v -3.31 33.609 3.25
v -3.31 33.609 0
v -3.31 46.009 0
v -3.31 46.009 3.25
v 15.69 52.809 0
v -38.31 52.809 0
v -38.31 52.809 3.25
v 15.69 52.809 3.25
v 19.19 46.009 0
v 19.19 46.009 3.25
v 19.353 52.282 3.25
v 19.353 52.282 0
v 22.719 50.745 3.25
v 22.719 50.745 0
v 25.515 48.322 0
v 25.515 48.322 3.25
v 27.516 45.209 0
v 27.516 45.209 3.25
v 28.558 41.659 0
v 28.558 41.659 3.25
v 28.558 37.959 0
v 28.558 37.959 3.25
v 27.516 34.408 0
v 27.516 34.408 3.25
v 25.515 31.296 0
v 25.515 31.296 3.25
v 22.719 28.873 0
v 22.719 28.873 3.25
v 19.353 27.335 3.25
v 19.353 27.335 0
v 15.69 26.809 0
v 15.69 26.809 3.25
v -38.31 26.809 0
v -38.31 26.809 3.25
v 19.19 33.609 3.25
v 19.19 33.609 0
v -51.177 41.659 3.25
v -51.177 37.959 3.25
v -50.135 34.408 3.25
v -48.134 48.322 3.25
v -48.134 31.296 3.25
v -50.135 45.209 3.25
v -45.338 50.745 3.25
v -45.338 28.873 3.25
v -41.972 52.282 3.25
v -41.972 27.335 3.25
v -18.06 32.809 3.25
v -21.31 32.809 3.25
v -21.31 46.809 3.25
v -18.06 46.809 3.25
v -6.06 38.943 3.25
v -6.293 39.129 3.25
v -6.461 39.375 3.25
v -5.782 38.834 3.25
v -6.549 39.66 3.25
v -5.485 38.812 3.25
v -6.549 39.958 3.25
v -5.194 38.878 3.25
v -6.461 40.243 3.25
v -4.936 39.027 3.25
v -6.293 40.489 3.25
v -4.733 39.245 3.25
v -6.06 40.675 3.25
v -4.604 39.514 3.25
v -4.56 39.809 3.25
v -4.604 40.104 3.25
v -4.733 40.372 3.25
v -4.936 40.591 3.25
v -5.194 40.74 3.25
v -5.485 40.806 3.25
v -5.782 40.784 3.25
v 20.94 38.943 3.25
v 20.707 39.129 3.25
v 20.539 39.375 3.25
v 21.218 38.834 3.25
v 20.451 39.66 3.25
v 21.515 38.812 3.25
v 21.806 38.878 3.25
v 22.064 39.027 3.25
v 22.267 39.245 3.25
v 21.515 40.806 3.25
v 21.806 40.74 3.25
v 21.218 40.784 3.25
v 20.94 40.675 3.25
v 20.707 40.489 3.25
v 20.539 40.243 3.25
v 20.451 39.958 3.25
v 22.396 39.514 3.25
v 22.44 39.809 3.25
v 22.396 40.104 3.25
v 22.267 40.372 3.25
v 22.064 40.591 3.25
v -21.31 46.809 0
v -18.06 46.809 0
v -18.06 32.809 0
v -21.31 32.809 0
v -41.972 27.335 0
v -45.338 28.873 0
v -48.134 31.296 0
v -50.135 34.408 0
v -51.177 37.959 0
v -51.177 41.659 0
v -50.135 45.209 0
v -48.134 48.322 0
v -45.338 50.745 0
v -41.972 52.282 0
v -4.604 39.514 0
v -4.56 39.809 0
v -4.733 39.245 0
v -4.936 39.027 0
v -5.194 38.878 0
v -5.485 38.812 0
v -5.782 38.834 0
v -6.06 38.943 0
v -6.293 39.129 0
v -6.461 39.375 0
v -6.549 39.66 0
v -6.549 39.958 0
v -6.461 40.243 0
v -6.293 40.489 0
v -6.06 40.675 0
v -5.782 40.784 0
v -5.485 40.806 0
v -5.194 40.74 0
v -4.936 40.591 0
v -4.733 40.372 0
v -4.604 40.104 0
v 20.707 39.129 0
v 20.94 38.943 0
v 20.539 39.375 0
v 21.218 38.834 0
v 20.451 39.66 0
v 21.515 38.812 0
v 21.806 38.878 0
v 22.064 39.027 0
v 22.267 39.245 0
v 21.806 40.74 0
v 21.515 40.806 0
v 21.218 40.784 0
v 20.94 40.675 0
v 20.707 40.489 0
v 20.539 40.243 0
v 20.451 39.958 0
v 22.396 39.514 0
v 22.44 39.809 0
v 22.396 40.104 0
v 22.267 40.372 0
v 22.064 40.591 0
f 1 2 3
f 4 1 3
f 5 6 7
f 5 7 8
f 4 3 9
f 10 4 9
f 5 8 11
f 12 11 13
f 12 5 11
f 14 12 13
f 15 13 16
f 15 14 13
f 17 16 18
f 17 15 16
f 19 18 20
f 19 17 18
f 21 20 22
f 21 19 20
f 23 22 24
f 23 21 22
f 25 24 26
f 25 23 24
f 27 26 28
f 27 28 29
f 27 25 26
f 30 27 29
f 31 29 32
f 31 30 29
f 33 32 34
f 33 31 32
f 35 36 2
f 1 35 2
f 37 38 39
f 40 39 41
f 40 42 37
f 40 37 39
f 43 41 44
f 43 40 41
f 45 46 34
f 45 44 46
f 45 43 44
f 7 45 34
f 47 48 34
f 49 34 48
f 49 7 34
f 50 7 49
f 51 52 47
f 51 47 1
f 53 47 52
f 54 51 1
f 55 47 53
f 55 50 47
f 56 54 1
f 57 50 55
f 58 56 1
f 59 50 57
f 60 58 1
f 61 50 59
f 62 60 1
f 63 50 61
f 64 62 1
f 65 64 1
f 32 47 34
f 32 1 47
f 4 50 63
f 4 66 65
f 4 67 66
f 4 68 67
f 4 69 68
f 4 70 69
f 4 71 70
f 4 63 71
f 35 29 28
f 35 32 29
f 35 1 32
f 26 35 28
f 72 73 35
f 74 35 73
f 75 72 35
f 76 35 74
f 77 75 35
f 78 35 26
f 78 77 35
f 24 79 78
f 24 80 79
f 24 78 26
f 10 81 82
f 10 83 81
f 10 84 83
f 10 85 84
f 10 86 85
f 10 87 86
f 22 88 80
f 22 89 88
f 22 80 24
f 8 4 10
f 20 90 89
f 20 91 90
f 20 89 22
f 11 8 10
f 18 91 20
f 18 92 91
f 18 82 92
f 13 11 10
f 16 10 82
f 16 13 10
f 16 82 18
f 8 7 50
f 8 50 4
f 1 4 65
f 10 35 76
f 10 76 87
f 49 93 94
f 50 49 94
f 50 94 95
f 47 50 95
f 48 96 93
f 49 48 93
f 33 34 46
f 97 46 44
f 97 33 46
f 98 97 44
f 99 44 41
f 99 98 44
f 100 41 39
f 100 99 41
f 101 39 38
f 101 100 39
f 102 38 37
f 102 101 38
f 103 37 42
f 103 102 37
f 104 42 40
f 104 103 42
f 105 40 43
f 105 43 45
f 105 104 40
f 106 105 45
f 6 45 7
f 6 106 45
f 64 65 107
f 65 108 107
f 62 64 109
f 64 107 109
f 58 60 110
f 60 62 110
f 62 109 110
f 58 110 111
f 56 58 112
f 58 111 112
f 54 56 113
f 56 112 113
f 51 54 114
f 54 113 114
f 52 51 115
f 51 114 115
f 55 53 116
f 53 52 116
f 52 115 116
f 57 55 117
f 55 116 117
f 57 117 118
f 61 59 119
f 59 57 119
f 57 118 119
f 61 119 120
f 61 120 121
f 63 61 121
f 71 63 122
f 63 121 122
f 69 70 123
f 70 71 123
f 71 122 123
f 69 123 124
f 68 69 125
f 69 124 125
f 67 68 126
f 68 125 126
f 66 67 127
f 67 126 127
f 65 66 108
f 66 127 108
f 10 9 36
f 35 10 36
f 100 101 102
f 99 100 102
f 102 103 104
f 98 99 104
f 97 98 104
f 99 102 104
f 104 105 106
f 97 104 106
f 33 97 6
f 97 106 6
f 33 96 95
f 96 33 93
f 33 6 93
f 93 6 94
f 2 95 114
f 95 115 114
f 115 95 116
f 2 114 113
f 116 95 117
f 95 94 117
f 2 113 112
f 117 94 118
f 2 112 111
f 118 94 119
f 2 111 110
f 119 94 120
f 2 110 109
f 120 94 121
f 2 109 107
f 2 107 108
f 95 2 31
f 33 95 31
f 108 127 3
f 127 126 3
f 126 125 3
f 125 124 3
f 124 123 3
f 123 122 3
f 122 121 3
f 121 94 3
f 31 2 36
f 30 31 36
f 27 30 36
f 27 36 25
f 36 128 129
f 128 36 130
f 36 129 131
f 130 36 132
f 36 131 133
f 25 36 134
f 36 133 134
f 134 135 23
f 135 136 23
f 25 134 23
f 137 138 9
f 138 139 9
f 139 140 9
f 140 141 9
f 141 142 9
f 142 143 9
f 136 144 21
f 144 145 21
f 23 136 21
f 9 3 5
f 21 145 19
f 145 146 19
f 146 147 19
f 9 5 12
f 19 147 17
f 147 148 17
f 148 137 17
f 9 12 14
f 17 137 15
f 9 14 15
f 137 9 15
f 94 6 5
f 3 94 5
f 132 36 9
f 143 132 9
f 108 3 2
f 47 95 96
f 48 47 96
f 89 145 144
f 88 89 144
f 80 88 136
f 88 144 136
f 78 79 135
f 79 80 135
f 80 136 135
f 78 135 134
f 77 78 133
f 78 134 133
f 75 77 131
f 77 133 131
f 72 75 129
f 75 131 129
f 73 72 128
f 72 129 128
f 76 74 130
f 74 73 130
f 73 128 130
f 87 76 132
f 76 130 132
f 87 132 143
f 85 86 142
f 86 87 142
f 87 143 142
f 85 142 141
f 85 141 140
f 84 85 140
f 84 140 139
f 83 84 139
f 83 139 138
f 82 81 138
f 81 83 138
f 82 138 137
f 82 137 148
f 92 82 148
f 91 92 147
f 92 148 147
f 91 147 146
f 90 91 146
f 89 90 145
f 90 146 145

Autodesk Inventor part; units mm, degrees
ref_plane "YZ Plane" through (0, 0, 0) normal (1, 0, 0) x (0, 1, 0)
ref_plane "XZ Plane" through (0, 0, 0) normal (0, 1, 0) x (-1, 0, 0)
ref_plane "XY Plane" through (0, 0, 0) normal (0, 0, 1) x (1, 0, 0)
sketch "Block1" plane through (0, 0, 0) normal (0, 0, 1) x (1, 0, 0)
  circle A0 centre (74.029, 24.2723) radius 1
  line L0 (49.279, 30.4723) -> (71.779, 30.4723)
  line L1 (71.779, 30.4723) -> (71.779, 18.0723)
  line L2 (71.779, 18.0723) -> (49.279, 18.0723)
  line L3 (49.279, 18.0723) -> (49.279, 30.4723)
  line L4 (49.279, 30.4723) -> (44.779, 30.4723)
  line L5 (44.779, 30.4723) -> (44.779, 18.0723)
  line L6 (44.779, 18.0723) -> (49.279, 18.0723)
  line L7 (49.279, 18.0723) -> (49.279, 30.4723)
  line L8 (71.779, 30.4723) -> (76.279, 30.4723)
  line L9 (76.279, 30.4723) -> (76.279, 18.0723)
  line L10 (76.279, 18.0723) -> (71.779, 18.0723)
  line L11 (71.779, 18.0723) -> (71.779, 30.4723)
  line L12 (44.779, 24.2723) -> (76.279, 24.2723) construction
  line L13 (47.029, 30.4723) -> (47.029, 18.0723) construction
  circle A1 centre (47.029, 24.2723) radius 1
  line L14 (74.029, 30.4723) -> (74.029, 18.0723) construction
  point P0 (60.979, 24.0984)
  dimension "d7" = 22.5
  dimension "d8" = 12.4
  dimension "d9" = 4.5
  dimension "d10" = 4.5
  dimension "d11" = 2
  dimension "d12" = 2
sketch "Sketch1" plane through (0, 0, 0) normal (0, 0, 1) x (1, 0, 0)
  line L0 (-92.7646, -8.503) -> (-89.7646, -8.503)
  line L1 (-89.7646, -8.503) -> (-89.7646, -11.753)
  line L2 (-89.7646, -11.753) -> (-92.7646, -11.753)
  line L3 (-92.7646, -11.753) -> (-92.7646, -8.503)
  line L4 (-92.7646, -21.6527) -> (-89.7646, -21.6527)
  line L5 (-89.7646, -21.6527) -> (-89.7646, -21.7527)
  line L6 (-89.7646, -21.7527) -> (-92.7646, -21.7527)
  line L7 (-92.7646, -21.7527) -> (-92.7646, -21.6527)
  line L8 (-51.3097, 52.8088) -> (28.6903, 52.8088)
  line L9 (28.6903, 52.8088) -> (28.6903, 26.8088)
  line L10 (28.6903, 26.8088) -> (-51.3097, 26.8088)
  line L11 (-51.3097, 26.8088) -> (-51.3097, 52.8088)
  line L12 (-51.3097, 39.8088) -> (28.6903, 39.8088) construction
  line L13 (-21.3097, 46.8088) -> (-18.0597, 46.8088)
  line L14 (-18.0597, 46.8088) -> (-18.0597, 32.8088)
  line L15 (-18.0597, 32.8088) -> (-21.3097, 32.8088)
  line L16 (-21.3097, 32.8088) -> (-21.3097, 46.8088)
  line L17 (-21.3097, 39.8088) -> (-18.0597, 39.8088) construction
  line L18 (-38.3097, 52.8088) -> (-38.3097, 26.8088) construction
  arc A0 (-38.3097, 52.8088) -> (-38.3097, 26.8088) centre (-38.3097, 39.8088) ccw
  line L19 (-11.3097, 52.8088) -> (-11.3097, 26.8088) construction
  line L20 (15.6903, 52.8088) -> (15.6903, 26.8088) construction
  arc A1 (15.6903, 26.8088) -> (15.6903, 52.8088) centre (15.6903, 39.8088) ccw
  circle A2 centre (-5.5597, 39.8088) radius 1
  line L21 (19.1903, 33.6088) -> (-3.3097, 33.6088)
  line L22 (-3.3097, 33.6088) -> (-3.3097, 46.0088)
  line L23 (-3.3097, 46.0088) -> (19.1903, 46.0088)
  line L24 (19.1903, 46.0088) -> (19.1903, 33.6088)
  line L25 (19.1903, 33.6088) -> (23.6903, 33.6088)
  line L26 (23.6903, 33.6088) -> (23.6903, 46.0088)
  line L27 (23.6903, 46.0088) -> (19.1903, 46.0088)
  line L28 (19.1903, 46.0088) -> (19.1903, 33.6088)
  line L29 (-3.3097, 33.6088) -> (-7.8097, 33.6088)
  line L30 (-7.8097, 33.6088) -> (-7.8097, 46.0088)
  line L31 (-7.8097, 46.0088) -> (-3.3097, 46.0088)
  line L32 (-3.3097, 46.0088) -> (-3.3097, 33.6088)
  line L33 (23.6903, 39.8088) -> (-7.8097, 39.8088) construction
  line L34 (21.4403, 33.6088) -> (21.4403, 46.0088) construction
  circle A3 centre (21.4403, 39.8088) radius 1
  line L35 (-5.5597, 33.6088) -> (-5.5597, 46.0088) construction
  point P0 (0, 0)
  dimension "d0" = 3
  dimension "mat" = 3.25
  dimension "d2" = 3
  dimension "d3" = 0.1
  dimension "d23" = 80
  dimension "d24" = 26
  dimension "d25" = 5
  dimension "d29" = 3.25
  dimension "d30" = 14
  dimension "d31" = 30
  dimension "d38" = 13
  dimension "d39" = 13
extrude "Extrusion5" add sketch "Sketch1" along normal blind 3.25 contours L8 A1 L10 A0 | L24 L27 L26 L25 | L29 L30 L31 L22
equation "\"d29\" = mat"
equation "\"d40\" = mat"
properties part number "arm-servo"
